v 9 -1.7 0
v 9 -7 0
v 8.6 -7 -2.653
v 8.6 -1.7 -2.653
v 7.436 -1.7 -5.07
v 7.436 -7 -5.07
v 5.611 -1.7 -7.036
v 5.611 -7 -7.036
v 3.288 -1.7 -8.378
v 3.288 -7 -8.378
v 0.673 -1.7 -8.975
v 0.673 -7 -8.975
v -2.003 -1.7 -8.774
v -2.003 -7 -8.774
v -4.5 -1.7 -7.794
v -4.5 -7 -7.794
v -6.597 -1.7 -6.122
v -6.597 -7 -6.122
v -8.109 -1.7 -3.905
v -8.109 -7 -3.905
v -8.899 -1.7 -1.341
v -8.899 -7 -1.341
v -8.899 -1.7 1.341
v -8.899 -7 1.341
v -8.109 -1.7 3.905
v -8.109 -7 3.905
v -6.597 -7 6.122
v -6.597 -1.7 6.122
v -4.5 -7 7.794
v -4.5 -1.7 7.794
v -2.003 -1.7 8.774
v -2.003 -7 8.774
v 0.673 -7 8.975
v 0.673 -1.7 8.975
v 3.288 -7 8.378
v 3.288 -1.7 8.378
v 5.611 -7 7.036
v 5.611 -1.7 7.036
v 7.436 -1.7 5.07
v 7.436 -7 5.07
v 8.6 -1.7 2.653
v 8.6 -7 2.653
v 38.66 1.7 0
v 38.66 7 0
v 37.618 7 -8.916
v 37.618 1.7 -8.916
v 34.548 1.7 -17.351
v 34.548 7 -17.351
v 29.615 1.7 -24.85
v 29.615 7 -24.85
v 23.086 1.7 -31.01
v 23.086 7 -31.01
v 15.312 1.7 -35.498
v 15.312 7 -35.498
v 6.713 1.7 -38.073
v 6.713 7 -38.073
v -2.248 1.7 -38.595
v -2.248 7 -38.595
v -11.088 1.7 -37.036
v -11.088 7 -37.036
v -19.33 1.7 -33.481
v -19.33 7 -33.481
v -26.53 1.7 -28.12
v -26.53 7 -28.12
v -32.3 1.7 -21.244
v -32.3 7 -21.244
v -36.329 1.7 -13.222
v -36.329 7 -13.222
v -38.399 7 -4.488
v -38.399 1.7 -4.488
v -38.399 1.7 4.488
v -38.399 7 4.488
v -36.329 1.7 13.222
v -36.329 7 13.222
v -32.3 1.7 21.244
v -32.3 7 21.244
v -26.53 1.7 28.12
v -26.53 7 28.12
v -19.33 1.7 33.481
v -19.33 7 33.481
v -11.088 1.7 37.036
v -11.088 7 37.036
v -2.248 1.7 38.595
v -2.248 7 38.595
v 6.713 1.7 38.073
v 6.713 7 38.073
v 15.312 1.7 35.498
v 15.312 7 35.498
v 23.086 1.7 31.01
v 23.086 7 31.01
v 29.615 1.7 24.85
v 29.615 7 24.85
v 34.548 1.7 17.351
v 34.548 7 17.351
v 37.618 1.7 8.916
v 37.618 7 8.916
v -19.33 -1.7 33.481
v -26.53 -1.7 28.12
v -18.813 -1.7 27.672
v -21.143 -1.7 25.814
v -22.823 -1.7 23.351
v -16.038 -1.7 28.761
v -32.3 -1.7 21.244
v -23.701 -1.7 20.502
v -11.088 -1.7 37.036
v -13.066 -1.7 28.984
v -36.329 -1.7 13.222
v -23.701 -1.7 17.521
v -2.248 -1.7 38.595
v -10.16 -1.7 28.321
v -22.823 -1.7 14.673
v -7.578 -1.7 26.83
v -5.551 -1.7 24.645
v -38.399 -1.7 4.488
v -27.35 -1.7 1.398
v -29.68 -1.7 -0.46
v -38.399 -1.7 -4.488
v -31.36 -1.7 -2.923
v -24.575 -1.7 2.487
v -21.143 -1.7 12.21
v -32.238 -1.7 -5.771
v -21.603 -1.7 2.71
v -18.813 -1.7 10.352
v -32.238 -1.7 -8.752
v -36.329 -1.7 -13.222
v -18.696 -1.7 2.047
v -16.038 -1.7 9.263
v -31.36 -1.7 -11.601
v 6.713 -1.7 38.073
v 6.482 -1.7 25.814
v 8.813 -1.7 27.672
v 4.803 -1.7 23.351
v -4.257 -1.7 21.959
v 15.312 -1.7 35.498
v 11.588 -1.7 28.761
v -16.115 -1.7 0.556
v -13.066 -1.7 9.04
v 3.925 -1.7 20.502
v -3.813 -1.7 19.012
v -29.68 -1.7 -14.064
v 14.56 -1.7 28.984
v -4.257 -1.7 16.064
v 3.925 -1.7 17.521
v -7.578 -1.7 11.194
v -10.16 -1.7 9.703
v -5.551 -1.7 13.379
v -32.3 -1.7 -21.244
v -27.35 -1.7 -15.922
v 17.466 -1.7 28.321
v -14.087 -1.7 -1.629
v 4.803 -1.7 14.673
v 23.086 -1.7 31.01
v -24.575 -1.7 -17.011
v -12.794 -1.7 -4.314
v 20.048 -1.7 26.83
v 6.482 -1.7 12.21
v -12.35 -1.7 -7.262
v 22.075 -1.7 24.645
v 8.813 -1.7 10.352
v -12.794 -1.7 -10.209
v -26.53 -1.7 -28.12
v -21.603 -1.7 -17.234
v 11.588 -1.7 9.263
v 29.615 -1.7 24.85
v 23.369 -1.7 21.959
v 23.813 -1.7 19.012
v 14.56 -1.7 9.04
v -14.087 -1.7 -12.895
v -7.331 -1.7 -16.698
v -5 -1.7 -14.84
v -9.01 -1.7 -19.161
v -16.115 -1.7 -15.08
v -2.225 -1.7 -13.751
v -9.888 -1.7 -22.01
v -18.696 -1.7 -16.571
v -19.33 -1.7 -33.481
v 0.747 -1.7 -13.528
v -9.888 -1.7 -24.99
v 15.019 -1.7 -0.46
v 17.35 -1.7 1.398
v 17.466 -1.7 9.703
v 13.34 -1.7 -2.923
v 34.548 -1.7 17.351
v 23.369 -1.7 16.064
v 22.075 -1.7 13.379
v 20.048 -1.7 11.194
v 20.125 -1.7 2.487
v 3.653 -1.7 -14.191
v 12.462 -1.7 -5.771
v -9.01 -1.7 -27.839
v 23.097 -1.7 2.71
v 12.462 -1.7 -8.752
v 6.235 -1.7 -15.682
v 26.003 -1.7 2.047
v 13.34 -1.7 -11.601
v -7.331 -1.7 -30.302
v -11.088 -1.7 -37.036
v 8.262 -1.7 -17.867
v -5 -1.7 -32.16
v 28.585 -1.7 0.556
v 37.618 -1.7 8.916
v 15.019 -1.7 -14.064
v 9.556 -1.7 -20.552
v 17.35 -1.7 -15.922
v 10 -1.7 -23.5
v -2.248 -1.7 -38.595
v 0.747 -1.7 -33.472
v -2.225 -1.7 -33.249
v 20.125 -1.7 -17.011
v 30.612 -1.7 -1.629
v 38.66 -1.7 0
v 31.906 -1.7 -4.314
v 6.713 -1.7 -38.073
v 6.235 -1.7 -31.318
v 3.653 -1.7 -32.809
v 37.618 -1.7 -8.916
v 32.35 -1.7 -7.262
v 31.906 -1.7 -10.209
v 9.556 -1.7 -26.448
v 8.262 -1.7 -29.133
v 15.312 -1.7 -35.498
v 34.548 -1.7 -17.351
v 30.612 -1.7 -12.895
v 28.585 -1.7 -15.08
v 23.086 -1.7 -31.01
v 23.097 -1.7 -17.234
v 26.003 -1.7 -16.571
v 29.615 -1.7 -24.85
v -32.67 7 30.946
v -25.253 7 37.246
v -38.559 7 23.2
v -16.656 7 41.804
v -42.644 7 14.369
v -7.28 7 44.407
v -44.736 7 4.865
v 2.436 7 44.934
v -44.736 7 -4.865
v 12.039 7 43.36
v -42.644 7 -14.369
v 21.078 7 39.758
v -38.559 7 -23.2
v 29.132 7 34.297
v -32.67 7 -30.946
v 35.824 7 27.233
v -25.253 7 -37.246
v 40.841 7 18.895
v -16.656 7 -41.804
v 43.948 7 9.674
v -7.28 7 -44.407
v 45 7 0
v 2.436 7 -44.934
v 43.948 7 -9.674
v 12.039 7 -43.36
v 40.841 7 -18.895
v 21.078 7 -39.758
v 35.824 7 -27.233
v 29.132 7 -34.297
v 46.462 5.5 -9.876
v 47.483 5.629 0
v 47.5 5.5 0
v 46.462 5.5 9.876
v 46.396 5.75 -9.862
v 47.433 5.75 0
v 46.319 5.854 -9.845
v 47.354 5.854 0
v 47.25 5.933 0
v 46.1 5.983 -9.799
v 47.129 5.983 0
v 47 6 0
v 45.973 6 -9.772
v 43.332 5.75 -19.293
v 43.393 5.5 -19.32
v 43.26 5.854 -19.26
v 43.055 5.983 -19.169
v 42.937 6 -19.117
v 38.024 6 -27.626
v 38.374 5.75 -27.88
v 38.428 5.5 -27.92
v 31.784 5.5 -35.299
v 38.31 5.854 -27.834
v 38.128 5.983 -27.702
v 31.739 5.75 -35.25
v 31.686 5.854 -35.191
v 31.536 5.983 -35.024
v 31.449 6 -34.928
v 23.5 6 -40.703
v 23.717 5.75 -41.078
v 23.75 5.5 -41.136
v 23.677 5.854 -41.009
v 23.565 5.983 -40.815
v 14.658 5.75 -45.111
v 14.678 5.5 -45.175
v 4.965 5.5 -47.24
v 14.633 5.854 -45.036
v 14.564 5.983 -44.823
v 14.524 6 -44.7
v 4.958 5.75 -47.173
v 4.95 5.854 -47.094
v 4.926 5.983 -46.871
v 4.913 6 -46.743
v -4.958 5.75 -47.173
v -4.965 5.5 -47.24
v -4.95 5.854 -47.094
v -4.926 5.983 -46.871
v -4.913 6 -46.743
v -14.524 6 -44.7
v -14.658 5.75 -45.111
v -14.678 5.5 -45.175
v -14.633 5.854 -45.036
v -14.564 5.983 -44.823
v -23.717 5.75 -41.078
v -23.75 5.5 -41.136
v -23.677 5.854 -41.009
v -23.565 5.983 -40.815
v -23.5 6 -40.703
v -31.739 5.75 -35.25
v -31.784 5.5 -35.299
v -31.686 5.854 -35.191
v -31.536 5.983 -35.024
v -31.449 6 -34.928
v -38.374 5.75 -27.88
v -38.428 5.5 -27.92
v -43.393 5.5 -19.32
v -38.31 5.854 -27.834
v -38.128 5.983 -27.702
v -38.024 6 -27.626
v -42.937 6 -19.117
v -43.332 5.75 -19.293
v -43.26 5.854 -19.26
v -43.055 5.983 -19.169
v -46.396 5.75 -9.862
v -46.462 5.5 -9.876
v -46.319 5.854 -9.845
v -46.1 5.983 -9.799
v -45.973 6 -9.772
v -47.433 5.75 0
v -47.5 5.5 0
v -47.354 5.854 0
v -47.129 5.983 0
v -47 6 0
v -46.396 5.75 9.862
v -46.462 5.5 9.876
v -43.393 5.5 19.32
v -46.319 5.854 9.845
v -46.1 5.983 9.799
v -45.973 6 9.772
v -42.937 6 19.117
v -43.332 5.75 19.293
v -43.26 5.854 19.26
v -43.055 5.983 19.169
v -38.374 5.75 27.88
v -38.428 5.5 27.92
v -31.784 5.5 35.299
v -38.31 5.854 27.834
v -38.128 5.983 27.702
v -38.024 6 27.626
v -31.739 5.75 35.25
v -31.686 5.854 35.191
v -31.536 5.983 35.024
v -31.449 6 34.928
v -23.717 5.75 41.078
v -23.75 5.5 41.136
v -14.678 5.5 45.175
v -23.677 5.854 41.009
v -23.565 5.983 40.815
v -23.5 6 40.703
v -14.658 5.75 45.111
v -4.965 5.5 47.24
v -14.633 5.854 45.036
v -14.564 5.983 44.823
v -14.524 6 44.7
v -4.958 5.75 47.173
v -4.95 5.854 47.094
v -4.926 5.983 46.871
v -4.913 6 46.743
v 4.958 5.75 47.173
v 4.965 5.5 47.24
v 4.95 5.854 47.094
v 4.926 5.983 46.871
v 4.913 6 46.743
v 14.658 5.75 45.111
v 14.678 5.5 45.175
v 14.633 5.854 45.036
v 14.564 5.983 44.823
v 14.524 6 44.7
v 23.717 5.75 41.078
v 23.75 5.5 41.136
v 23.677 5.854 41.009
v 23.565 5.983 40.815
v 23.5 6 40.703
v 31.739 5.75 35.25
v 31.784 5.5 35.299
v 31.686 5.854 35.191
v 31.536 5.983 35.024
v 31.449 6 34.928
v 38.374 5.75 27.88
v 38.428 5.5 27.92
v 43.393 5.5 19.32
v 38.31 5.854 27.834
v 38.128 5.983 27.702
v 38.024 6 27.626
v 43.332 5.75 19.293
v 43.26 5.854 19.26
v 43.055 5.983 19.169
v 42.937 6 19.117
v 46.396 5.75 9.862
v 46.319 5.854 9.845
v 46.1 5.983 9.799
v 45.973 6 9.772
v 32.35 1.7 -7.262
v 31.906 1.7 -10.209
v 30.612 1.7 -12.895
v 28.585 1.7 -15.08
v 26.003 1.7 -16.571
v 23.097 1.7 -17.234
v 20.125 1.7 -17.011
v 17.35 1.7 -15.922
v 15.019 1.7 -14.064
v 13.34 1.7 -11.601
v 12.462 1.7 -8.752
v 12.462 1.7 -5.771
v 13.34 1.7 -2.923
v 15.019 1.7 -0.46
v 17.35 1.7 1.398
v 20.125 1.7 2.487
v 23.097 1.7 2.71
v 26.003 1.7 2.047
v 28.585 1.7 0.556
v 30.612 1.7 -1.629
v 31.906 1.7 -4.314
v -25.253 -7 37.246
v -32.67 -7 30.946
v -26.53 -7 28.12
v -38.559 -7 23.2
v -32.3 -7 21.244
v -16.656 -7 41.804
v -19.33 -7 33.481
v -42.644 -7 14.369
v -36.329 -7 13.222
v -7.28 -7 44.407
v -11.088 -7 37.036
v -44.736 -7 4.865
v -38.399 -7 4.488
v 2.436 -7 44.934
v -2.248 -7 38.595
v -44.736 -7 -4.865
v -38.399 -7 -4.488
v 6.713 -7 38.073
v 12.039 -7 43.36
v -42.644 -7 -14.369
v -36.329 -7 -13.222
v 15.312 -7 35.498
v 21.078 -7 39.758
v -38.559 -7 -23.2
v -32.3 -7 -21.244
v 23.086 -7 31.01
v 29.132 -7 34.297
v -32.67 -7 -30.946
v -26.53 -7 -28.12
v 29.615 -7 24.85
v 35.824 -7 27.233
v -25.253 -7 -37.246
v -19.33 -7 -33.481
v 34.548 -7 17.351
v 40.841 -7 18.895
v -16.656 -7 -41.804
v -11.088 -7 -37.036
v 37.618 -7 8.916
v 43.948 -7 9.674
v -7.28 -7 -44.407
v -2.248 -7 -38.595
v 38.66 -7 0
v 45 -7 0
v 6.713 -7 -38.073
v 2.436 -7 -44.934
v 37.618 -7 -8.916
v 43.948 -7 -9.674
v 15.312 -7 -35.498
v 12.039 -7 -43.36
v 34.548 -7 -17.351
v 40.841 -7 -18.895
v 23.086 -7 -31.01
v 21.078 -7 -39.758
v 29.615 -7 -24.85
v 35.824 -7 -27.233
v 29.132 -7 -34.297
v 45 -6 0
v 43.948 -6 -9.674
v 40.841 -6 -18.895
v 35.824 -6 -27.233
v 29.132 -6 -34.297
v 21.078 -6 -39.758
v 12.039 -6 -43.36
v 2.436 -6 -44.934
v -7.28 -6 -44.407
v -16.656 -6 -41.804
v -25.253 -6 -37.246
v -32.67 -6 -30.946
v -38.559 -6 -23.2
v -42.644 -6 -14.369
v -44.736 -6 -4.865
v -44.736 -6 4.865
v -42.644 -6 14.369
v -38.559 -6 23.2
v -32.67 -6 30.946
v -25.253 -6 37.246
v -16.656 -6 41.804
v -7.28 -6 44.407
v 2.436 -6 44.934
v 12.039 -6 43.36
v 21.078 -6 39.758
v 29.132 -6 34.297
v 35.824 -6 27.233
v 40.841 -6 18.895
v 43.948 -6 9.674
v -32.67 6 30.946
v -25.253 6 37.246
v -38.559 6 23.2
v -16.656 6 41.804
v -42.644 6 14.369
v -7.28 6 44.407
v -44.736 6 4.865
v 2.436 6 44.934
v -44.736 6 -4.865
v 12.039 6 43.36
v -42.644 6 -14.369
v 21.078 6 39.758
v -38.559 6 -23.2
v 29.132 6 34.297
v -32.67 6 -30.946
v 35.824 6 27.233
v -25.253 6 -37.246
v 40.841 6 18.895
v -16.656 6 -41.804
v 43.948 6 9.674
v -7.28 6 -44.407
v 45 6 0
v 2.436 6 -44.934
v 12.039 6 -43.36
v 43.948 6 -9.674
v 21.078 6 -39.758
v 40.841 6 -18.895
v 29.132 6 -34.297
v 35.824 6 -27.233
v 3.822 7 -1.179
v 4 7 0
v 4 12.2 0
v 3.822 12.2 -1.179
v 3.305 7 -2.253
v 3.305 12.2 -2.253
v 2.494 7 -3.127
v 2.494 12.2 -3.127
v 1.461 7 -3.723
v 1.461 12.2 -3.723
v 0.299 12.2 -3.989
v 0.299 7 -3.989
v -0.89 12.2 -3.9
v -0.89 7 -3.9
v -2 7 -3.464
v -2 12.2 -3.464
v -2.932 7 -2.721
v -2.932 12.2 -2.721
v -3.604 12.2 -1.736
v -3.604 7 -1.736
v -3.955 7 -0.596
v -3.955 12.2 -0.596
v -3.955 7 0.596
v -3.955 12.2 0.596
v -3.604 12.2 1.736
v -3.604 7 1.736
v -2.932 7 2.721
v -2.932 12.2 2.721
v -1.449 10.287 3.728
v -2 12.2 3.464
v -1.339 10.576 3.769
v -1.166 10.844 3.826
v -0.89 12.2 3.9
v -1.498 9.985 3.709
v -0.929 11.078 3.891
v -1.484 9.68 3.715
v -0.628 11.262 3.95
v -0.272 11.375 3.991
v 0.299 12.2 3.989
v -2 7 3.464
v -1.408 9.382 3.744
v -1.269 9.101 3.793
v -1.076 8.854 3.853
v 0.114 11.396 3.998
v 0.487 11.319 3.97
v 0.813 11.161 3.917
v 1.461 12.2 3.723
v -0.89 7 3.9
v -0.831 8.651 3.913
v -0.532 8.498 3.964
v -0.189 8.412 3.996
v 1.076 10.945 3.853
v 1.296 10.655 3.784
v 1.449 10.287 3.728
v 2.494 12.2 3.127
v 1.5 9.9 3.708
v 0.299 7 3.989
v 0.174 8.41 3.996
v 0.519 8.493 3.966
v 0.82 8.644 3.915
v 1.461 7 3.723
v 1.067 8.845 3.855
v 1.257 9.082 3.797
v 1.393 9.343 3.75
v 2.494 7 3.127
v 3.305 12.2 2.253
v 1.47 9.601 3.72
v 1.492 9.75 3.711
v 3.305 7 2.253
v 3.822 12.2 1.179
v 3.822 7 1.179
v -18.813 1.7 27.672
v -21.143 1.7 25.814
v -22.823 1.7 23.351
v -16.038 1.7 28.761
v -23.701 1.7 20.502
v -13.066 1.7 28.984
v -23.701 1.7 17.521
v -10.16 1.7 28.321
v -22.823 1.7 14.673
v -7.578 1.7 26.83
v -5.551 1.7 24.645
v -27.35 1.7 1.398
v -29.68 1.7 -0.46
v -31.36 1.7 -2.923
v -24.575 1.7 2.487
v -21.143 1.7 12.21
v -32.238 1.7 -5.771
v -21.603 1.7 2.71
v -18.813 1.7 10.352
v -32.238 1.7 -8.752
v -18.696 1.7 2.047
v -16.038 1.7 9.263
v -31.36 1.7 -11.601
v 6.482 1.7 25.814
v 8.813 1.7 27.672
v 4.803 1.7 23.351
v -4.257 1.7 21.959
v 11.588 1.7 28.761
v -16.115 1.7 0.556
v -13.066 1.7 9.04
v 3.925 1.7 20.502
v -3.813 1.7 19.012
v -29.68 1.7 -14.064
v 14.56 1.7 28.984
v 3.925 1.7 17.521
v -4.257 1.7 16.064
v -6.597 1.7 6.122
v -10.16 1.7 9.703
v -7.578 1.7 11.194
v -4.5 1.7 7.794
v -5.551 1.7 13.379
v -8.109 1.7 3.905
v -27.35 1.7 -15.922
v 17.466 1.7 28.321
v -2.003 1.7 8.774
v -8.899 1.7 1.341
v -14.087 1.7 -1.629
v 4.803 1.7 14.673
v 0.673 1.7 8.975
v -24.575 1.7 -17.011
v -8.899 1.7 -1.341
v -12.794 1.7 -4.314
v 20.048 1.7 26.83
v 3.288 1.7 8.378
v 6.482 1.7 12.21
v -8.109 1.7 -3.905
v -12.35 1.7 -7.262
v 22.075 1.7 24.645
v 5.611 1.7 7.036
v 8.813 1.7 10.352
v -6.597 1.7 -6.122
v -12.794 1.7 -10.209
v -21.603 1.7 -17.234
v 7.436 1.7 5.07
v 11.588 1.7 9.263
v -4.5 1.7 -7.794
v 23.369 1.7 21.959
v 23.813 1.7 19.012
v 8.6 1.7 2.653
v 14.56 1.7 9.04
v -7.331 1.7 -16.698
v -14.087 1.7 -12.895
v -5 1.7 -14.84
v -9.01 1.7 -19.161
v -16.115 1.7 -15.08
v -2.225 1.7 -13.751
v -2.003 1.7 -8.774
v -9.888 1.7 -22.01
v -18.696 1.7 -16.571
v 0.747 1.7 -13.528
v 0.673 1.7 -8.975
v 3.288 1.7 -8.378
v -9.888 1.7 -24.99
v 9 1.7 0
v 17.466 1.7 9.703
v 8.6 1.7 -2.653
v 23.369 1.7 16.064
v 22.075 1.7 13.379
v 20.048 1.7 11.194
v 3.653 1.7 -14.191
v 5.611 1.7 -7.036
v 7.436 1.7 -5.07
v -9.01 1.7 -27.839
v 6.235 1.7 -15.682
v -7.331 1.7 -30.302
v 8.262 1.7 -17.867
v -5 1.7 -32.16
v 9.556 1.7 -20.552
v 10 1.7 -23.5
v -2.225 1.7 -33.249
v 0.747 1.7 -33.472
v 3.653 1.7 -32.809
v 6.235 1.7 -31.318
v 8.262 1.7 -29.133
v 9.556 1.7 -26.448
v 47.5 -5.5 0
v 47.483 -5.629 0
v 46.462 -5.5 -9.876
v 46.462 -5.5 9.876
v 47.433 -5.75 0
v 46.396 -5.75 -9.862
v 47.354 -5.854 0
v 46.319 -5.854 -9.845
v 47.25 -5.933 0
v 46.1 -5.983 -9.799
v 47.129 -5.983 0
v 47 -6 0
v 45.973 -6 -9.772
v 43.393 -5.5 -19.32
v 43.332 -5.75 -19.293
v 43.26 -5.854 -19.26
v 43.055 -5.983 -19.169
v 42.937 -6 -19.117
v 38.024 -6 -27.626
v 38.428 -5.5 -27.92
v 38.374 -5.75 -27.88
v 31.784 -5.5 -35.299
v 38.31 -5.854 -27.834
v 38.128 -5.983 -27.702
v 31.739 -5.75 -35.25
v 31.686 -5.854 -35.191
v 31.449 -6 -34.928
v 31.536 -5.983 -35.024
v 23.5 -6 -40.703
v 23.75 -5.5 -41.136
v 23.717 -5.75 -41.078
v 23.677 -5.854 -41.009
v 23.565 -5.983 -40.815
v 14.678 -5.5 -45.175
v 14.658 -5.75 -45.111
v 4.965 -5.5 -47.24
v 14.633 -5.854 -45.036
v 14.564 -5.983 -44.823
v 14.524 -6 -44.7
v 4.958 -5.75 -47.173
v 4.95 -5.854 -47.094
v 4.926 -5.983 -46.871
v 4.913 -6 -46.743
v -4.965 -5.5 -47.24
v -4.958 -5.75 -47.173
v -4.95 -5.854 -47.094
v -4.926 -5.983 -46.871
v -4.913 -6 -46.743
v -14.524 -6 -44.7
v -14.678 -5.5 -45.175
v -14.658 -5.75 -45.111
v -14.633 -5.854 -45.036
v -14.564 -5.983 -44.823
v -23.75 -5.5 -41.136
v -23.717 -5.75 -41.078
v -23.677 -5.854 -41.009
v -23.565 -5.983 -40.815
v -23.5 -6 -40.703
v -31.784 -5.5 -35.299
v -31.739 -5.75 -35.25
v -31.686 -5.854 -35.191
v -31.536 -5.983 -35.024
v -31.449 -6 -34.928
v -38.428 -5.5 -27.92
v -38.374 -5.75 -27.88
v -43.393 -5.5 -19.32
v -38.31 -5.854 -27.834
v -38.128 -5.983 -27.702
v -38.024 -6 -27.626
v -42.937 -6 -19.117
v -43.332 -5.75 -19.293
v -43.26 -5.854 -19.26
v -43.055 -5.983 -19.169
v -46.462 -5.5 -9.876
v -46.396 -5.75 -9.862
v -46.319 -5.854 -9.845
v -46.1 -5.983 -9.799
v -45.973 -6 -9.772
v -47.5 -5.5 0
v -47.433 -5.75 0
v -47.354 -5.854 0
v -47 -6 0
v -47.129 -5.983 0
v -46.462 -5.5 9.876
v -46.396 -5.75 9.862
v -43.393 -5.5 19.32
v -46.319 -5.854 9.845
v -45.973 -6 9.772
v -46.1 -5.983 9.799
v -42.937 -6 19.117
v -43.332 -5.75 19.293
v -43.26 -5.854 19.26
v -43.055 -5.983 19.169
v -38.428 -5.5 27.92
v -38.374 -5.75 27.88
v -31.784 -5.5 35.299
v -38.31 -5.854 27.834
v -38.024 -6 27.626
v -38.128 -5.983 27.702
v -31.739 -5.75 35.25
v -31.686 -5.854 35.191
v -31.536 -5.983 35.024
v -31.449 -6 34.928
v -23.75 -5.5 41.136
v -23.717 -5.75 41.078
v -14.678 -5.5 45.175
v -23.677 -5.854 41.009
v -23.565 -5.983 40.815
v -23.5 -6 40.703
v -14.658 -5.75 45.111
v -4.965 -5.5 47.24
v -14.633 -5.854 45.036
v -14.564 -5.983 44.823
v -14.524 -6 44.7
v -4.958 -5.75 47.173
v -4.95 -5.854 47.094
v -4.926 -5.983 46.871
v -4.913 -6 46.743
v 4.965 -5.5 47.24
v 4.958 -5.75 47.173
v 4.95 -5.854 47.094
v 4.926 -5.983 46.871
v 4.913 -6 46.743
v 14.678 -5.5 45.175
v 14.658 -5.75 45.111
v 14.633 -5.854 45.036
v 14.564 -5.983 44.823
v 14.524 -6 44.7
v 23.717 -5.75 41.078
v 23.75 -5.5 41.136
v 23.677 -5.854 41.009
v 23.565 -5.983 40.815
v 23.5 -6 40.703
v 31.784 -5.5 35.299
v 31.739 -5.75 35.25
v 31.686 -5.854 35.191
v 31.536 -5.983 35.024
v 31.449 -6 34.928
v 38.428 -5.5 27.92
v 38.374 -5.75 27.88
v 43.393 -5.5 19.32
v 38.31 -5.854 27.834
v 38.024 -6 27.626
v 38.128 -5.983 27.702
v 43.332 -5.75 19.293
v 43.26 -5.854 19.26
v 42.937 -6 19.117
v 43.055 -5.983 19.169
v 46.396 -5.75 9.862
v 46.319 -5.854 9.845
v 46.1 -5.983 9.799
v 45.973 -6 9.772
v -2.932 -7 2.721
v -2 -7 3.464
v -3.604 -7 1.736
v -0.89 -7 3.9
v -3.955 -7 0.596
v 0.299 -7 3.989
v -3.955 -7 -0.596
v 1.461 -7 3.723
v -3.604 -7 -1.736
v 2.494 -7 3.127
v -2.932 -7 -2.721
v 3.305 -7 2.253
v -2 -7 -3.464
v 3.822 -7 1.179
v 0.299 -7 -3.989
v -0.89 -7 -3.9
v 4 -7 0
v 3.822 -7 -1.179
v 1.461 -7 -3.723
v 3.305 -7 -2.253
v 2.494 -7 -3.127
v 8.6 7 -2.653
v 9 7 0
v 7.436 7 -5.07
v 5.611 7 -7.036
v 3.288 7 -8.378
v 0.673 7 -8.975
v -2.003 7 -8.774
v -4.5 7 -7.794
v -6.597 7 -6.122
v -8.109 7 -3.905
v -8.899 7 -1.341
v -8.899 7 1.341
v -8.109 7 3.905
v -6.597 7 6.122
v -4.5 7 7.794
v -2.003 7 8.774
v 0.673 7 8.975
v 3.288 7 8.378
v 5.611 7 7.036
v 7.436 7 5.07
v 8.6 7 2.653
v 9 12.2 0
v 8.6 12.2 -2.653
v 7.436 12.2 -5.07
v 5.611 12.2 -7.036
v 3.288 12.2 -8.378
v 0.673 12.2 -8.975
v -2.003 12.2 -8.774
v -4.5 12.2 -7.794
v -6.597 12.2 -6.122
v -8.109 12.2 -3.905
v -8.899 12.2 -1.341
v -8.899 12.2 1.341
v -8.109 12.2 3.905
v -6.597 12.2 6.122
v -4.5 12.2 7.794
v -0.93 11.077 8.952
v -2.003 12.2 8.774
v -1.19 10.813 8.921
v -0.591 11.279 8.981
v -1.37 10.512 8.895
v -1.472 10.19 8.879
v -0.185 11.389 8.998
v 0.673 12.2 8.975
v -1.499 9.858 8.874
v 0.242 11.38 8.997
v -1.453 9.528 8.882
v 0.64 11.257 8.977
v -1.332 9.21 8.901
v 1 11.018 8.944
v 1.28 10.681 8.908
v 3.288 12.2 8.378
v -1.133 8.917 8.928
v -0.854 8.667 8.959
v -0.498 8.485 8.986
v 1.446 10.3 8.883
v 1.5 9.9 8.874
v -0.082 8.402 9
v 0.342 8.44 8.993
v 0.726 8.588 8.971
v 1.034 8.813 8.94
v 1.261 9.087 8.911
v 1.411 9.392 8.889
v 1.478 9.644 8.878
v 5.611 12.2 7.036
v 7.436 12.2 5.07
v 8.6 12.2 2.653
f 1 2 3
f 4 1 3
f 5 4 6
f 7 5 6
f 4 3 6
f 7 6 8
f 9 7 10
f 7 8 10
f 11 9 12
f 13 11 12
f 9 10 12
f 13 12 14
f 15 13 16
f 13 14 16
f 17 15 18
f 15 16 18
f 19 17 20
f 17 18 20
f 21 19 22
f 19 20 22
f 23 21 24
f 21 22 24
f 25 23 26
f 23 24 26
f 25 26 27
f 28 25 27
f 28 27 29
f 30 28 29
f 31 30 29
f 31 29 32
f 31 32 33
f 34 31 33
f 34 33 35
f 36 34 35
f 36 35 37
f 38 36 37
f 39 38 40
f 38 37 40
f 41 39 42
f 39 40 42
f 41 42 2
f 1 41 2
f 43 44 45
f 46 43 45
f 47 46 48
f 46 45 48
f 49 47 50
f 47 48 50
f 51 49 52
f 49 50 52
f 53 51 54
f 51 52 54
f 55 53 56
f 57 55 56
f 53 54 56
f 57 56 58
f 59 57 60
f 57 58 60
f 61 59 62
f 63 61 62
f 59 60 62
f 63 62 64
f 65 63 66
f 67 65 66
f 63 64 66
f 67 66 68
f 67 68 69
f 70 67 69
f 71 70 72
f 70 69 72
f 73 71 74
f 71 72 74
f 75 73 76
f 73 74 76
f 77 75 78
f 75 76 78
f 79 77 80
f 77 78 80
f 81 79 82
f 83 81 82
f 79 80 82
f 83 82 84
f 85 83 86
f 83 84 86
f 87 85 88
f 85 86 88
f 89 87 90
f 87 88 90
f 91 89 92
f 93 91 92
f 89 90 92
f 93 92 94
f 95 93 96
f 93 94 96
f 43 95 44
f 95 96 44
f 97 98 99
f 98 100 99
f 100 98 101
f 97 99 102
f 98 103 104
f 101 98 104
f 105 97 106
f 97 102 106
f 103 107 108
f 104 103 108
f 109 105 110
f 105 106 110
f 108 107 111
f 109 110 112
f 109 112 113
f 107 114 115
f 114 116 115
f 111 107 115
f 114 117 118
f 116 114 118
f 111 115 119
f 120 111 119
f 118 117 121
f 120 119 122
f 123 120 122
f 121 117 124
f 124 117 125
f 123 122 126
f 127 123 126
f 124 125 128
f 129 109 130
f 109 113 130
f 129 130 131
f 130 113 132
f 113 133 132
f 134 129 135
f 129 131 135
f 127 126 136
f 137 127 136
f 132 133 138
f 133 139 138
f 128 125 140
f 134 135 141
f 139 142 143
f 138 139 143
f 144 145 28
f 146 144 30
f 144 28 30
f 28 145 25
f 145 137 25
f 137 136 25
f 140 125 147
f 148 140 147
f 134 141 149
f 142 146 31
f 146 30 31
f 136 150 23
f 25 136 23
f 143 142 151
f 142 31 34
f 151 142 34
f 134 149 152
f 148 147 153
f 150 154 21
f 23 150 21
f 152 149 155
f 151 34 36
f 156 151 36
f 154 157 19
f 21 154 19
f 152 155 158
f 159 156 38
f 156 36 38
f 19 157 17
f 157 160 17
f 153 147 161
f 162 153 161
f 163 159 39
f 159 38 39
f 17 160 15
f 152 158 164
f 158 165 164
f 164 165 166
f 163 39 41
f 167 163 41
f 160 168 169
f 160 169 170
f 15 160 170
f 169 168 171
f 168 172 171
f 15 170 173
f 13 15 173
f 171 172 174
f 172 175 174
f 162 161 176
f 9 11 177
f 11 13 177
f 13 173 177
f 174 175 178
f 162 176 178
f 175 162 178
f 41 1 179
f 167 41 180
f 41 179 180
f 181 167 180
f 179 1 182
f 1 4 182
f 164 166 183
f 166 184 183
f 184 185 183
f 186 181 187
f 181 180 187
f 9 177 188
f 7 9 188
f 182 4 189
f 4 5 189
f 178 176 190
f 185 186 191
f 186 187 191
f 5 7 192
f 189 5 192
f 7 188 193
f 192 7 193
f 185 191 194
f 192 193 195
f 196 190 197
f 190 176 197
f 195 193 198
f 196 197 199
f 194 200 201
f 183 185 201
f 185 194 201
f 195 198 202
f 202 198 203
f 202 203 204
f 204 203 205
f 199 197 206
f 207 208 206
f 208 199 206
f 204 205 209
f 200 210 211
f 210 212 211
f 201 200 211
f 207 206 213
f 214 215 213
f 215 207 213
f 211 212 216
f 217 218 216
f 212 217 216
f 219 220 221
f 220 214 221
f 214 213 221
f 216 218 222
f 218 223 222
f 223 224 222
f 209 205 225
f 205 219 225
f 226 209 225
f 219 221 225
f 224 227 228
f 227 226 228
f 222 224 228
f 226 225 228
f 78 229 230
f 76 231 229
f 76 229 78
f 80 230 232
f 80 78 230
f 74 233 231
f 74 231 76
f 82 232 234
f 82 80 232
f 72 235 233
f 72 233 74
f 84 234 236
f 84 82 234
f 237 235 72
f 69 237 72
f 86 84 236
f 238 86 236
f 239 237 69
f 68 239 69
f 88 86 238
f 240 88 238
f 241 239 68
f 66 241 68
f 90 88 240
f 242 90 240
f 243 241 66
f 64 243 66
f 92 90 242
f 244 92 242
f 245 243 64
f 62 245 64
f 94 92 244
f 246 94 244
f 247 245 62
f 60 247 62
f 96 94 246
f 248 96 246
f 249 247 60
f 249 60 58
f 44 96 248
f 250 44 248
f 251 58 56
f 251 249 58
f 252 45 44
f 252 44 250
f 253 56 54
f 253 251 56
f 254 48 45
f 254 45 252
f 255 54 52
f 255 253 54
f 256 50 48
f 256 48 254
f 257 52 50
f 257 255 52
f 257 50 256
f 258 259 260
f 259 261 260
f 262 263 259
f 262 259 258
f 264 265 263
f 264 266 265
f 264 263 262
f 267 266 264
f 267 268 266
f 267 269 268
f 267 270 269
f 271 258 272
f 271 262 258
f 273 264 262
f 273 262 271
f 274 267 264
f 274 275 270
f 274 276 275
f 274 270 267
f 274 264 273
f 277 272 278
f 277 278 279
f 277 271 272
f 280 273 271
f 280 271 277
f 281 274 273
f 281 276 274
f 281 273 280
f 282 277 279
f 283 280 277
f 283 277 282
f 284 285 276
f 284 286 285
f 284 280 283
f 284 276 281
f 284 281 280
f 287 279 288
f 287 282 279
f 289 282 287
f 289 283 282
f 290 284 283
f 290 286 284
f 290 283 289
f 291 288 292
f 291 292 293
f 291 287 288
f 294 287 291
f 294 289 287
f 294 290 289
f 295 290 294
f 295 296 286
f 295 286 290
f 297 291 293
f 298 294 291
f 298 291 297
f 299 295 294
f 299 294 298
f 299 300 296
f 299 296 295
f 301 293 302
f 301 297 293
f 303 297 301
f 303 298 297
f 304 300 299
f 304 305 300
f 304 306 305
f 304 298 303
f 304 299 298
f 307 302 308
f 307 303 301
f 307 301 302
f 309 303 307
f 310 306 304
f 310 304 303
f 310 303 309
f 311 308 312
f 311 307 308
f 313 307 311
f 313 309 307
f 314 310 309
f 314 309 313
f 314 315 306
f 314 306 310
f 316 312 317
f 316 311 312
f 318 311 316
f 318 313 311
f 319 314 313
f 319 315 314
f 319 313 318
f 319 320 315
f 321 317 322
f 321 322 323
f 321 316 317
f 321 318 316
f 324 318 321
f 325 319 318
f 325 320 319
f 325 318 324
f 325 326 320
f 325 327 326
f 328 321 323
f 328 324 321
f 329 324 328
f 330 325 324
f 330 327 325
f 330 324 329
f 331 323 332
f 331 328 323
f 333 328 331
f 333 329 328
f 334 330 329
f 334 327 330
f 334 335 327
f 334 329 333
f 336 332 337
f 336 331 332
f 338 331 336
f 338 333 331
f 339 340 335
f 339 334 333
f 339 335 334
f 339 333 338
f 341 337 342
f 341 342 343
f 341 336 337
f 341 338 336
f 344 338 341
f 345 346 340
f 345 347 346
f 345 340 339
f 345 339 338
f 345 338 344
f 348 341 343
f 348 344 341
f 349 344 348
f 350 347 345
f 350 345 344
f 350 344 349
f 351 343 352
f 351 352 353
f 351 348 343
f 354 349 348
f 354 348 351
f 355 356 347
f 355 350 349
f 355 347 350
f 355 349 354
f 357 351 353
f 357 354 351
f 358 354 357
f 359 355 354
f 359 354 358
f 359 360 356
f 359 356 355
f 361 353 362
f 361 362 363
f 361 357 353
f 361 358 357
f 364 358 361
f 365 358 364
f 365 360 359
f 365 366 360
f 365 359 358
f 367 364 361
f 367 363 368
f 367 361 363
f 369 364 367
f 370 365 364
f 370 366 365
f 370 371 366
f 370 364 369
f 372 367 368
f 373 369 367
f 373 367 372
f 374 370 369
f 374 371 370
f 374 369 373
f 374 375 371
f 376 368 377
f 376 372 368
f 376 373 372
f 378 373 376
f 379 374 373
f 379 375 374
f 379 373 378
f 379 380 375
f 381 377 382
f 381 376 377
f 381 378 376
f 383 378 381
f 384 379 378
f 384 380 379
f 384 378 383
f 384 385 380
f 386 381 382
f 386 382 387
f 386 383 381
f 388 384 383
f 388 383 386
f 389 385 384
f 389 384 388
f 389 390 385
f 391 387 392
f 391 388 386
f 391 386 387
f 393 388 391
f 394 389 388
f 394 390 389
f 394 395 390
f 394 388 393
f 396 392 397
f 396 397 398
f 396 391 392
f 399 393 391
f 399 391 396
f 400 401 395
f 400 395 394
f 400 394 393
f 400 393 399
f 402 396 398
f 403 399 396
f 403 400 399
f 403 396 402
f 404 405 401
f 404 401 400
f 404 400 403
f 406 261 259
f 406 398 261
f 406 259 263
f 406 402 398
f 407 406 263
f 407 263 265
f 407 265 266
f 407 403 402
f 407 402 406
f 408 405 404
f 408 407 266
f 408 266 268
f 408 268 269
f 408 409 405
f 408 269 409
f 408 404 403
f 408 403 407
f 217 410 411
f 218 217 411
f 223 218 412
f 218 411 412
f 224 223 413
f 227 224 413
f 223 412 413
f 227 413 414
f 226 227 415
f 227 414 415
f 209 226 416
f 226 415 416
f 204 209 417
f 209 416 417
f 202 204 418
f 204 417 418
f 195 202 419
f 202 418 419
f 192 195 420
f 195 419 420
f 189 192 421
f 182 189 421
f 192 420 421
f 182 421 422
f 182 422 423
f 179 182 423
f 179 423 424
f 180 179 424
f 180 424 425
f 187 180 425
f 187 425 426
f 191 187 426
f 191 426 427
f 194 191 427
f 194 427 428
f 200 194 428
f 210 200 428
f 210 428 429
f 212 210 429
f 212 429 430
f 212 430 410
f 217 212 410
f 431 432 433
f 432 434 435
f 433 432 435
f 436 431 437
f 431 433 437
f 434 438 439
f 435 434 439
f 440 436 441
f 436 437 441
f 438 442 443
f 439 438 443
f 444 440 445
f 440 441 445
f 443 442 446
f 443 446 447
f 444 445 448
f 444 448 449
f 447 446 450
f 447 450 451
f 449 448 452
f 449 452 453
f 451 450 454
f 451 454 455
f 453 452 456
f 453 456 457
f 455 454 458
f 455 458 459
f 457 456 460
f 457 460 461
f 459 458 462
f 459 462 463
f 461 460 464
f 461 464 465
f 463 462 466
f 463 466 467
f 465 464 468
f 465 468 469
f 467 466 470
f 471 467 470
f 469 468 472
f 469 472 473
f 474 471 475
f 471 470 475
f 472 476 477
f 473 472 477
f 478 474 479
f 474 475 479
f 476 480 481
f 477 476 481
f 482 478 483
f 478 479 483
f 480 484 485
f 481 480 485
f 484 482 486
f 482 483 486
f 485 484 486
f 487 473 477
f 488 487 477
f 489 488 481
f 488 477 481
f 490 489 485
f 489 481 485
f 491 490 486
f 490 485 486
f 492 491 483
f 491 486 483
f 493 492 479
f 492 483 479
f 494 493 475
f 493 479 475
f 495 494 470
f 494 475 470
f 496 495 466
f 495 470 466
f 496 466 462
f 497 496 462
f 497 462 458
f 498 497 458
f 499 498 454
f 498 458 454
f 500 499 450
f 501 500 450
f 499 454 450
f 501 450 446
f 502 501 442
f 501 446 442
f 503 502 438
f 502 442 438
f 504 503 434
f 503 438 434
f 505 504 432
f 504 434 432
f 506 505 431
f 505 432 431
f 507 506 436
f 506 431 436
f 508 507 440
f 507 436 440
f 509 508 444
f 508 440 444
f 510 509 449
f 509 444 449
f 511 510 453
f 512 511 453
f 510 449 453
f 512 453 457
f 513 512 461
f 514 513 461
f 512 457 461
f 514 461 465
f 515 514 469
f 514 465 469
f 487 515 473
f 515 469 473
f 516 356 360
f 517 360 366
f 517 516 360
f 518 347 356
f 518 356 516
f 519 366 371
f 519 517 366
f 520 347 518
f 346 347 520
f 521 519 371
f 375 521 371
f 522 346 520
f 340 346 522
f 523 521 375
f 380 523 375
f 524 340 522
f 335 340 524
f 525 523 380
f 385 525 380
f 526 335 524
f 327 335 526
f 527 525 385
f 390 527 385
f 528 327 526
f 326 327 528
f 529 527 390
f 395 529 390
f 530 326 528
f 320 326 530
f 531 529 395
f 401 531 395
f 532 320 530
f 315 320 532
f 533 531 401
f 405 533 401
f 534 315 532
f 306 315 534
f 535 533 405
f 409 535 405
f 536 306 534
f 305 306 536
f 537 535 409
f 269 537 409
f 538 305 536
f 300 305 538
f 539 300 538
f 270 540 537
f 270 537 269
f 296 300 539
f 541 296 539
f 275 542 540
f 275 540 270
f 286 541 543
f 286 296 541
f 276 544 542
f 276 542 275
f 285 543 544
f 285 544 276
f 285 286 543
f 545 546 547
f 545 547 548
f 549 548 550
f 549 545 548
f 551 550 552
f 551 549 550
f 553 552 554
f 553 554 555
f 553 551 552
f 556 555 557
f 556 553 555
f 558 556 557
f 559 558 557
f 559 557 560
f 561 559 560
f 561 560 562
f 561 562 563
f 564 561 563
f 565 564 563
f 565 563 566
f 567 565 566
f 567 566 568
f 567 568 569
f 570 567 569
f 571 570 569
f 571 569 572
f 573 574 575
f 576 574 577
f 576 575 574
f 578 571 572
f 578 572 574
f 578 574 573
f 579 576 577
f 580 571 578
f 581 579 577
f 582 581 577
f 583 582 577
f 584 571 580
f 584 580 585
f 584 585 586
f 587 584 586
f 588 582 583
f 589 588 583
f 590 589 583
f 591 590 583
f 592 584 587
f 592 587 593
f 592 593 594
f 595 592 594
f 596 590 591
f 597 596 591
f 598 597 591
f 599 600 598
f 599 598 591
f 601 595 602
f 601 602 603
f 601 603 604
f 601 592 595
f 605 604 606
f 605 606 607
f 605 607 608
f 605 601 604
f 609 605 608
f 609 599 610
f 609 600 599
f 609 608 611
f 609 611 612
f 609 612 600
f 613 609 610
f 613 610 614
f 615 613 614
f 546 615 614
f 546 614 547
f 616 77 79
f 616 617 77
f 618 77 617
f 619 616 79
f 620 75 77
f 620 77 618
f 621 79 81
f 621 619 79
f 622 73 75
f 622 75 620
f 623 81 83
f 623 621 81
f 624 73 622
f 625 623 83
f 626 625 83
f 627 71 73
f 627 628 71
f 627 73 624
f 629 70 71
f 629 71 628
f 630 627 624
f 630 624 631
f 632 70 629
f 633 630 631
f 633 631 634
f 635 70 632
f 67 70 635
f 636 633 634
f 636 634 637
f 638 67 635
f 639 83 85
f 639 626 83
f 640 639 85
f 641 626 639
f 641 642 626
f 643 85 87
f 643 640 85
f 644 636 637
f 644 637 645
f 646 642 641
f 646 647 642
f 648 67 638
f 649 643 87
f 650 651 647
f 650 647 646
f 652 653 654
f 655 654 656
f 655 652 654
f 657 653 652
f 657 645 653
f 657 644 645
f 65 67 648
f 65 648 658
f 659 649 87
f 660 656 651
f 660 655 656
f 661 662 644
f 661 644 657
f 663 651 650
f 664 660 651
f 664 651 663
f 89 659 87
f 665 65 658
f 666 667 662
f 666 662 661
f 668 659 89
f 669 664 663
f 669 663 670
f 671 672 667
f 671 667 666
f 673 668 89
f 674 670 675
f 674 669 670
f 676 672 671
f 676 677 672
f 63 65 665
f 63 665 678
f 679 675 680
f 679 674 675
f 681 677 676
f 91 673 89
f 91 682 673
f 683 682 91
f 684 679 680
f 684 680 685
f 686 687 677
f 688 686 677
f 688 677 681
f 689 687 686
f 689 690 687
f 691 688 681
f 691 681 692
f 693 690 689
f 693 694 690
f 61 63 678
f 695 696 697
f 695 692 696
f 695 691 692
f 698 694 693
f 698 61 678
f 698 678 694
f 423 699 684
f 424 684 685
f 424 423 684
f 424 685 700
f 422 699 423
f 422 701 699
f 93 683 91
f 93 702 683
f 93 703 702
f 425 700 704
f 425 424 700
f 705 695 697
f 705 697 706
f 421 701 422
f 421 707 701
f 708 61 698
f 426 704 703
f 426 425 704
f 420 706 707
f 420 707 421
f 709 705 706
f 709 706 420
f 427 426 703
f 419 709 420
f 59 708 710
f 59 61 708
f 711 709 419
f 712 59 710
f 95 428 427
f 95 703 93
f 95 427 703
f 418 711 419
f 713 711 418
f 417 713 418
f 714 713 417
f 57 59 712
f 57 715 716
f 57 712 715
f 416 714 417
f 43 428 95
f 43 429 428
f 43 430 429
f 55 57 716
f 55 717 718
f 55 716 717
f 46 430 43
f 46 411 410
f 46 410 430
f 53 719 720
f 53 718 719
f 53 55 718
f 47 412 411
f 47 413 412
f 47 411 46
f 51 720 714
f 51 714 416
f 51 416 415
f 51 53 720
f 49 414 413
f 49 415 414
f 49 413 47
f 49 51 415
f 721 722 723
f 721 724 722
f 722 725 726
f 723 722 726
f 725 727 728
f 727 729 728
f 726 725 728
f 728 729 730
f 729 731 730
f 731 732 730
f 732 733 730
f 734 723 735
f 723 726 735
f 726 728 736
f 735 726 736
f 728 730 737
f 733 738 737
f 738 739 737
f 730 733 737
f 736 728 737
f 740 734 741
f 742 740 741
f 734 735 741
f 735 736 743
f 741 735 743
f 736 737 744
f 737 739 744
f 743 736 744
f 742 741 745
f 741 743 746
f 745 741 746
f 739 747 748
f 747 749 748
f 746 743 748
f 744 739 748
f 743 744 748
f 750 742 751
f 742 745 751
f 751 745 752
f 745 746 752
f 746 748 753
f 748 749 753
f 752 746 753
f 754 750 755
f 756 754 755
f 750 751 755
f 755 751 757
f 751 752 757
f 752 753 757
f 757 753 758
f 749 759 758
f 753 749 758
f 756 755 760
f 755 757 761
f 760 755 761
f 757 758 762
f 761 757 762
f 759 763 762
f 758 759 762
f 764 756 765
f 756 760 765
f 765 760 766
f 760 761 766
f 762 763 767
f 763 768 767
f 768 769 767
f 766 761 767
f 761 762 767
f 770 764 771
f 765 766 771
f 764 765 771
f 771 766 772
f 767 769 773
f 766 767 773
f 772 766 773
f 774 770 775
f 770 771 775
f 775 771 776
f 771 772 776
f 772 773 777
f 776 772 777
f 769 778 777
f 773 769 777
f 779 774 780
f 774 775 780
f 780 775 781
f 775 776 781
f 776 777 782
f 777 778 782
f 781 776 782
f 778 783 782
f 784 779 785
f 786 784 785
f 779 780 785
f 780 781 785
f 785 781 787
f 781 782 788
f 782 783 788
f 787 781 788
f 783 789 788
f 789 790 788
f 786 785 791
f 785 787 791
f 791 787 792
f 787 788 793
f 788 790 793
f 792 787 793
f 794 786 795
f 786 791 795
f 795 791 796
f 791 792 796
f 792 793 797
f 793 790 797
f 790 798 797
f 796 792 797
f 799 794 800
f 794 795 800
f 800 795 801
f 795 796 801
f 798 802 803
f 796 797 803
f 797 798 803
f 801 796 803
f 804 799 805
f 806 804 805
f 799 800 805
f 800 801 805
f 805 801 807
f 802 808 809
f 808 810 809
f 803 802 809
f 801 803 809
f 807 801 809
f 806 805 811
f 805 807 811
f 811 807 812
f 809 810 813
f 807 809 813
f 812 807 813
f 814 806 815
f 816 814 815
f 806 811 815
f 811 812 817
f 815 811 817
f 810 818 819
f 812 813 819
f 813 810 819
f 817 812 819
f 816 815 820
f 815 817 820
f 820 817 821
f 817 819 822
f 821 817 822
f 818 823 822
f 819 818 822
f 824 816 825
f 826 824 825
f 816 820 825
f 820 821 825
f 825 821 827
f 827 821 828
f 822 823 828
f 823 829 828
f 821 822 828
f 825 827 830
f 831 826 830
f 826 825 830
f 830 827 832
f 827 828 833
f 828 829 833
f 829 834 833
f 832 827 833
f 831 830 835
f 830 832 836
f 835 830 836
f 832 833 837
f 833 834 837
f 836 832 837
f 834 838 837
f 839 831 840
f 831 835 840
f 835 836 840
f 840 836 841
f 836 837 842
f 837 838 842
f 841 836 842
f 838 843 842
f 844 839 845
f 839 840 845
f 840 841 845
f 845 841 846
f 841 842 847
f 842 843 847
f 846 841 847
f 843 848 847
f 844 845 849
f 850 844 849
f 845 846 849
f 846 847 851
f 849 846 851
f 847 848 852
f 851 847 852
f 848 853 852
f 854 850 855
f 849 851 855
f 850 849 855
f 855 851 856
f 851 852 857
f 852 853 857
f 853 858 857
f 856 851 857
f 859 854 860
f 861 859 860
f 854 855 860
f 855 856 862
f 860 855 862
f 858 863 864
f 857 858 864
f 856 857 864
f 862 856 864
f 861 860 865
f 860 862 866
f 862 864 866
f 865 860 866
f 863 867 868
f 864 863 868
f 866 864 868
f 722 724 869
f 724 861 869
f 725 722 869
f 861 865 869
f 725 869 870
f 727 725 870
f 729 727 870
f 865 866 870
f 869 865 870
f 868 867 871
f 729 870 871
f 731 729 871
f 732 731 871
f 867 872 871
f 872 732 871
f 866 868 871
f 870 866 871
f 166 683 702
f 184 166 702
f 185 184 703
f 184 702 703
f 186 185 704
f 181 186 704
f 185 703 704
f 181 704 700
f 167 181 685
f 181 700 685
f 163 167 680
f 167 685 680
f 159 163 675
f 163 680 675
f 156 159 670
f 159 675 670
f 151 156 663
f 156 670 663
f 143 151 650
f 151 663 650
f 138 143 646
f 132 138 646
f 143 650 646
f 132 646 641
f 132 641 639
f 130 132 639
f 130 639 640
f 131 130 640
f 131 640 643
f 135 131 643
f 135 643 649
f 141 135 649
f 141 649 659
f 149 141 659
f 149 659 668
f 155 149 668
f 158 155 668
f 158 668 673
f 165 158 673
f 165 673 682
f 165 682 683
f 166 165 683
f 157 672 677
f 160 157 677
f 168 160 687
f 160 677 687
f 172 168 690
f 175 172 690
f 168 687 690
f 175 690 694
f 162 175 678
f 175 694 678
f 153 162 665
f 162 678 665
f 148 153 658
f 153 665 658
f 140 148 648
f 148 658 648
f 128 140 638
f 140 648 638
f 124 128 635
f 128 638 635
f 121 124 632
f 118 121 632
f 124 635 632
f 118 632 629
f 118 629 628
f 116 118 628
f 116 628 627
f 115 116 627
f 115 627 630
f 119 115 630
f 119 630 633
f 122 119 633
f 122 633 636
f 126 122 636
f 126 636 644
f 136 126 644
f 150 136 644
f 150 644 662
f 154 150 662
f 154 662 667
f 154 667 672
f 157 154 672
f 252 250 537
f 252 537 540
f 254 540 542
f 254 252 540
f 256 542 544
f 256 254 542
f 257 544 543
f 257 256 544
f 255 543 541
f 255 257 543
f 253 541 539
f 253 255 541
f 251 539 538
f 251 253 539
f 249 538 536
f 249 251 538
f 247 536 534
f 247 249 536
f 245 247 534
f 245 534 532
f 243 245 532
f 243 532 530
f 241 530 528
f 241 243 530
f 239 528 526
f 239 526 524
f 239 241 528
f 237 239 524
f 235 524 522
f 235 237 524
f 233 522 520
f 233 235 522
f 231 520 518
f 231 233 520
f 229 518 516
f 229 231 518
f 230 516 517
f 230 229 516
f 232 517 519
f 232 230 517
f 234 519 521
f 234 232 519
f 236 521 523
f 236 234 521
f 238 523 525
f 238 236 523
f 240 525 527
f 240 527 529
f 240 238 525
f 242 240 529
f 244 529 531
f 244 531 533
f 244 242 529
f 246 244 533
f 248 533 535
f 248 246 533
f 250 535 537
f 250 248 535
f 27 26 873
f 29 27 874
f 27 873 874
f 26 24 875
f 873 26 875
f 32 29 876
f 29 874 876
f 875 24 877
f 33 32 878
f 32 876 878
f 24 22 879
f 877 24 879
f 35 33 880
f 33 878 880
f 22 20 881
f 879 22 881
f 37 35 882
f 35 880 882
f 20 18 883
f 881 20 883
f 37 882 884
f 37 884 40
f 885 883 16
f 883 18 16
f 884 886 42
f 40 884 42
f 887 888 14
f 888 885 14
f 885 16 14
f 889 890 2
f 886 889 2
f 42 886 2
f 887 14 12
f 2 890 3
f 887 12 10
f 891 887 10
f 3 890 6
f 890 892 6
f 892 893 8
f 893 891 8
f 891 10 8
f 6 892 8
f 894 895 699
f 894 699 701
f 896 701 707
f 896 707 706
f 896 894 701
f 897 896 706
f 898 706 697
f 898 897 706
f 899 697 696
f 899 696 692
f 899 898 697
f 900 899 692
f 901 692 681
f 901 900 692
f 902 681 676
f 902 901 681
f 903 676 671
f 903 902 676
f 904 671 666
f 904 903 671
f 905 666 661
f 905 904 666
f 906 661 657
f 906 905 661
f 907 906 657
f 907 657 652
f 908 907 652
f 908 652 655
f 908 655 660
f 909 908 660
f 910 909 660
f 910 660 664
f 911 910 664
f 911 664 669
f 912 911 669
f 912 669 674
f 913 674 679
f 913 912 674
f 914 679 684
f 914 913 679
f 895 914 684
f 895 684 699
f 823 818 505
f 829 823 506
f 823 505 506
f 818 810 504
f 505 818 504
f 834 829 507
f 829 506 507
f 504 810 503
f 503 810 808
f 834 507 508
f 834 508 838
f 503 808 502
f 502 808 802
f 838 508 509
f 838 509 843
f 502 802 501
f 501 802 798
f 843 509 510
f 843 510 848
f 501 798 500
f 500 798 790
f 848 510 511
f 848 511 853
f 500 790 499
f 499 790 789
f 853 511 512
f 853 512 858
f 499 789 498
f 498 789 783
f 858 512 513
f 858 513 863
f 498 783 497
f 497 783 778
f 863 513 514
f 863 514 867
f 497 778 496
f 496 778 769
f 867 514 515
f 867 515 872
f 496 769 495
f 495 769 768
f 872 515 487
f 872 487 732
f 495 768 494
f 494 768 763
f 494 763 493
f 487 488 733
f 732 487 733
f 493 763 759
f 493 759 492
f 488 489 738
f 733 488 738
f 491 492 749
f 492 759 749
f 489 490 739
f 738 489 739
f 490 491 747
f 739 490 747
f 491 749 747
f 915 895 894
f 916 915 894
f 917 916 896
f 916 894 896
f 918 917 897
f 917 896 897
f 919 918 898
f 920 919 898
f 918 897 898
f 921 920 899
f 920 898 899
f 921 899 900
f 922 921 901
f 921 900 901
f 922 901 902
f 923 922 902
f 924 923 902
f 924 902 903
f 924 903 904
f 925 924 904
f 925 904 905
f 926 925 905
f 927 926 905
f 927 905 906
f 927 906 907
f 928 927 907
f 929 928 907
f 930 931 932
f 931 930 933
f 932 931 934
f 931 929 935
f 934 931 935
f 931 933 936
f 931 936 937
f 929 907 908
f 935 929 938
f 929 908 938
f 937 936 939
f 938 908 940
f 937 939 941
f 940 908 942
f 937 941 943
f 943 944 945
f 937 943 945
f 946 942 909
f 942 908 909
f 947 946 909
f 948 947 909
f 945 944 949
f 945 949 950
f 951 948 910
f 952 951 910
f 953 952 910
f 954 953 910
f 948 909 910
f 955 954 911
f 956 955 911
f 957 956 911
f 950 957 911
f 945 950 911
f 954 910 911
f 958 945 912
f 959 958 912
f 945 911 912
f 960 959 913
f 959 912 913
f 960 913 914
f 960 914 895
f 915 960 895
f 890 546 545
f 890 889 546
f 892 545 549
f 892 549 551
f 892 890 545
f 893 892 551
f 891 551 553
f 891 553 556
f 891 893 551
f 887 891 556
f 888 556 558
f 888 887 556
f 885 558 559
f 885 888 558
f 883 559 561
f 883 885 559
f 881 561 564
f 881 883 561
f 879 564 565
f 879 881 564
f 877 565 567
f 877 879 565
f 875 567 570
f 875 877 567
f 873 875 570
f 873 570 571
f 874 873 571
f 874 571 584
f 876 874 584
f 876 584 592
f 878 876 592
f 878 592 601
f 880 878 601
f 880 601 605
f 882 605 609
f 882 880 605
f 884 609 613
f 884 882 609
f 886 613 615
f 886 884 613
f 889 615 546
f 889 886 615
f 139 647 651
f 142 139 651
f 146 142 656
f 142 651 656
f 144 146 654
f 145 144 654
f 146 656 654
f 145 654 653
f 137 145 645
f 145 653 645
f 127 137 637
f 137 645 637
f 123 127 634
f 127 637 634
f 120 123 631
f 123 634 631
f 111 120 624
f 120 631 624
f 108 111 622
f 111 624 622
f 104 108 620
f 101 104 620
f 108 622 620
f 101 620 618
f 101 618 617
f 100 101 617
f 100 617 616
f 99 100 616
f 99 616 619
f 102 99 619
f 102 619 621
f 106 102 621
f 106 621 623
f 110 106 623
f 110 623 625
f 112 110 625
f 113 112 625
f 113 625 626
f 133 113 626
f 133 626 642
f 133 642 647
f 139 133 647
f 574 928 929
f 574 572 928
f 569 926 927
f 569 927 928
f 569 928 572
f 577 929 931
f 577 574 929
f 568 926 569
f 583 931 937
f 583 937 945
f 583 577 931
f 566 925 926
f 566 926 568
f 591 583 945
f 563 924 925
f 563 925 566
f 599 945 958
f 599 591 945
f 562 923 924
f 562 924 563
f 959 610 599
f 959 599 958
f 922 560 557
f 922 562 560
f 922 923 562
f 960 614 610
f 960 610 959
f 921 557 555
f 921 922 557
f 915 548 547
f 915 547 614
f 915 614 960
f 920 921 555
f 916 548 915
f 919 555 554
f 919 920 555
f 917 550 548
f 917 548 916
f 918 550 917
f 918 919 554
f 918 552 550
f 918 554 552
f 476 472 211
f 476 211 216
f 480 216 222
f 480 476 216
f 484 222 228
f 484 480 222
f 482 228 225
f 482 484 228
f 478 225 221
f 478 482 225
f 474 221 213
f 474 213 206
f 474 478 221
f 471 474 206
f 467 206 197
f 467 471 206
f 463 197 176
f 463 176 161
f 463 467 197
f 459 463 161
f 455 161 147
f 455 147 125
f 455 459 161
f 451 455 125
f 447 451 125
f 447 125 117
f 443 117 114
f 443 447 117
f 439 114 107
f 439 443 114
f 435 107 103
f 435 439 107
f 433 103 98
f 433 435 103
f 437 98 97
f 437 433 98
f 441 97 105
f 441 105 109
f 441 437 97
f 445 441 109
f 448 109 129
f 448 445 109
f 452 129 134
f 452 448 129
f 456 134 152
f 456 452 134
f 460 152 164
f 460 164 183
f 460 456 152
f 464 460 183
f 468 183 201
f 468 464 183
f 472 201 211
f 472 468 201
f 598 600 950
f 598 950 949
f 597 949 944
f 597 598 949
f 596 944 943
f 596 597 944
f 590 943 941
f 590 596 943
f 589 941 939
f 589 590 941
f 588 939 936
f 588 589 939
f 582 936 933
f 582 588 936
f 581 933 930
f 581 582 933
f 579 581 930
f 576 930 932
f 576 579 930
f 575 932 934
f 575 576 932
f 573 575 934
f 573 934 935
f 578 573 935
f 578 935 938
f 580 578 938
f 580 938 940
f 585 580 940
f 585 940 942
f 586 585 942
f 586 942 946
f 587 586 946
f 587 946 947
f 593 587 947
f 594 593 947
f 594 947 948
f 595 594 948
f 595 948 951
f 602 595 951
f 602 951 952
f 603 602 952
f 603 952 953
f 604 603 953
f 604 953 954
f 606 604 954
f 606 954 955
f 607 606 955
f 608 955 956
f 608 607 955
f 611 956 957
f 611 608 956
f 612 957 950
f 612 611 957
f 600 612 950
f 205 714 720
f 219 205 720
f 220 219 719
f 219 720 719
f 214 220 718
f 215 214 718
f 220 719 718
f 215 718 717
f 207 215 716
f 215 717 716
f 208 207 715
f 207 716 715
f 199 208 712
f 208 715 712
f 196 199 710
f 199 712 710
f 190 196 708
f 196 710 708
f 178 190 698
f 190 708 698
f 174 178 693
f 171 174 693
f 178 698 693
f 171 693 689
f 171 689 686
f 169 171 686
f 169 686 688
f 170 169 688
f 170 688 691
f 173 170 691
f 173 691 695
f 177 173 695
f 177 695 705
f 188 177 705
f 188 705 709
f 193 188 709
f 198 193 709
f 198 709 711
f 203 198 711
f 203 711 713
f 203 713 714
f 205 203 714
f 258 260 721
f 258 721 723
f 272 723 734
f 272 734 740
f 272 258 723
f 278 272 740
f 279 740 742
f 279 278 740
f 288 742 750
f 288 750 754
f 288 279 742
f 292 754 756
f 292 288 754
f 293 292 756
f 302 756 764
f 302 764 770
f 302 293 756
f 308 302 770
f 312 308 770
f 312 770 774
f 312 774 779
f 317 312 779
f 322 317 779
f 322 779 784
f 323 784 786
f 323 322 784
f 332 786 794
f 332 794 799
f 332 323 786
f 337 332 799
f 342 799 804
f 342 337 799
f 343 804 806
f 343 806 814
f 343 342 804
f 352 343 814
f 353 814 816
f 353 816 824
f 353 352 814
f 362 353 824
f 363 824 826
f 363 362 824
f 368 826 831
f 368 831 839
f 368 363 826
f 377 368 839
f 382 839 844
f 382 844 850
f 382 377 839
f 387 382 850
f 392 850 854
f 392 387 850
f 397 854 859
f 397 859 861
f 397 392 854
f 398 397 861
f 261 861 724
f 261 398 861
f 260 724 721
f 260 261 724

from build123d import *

# Parameters (mm, degrees)
SKETCH_1_R          = 47.5
SKETCH_1_R_2        = 9
SKETCH_1_R_3        = 4
EXTRUDE_1_DEPTH     = 7
SKETCH_2_R          = 47.5
SKETCH_2_R_2        = 45
CUT_EXTRUDE_1_DEPTH = 1
SKETCH_3_R          = 38.66
SKETCH_3_R_2        = 9
CUT_EXTRUDE_2_DEPTH = 5.3
SKETCH_4_R          = 10
CUT_EXTRUDE_3_DEPTH = 9.7
FILLET_1_R          = 0.5
SKETCH_5_R          = 9
SKETCH_5_R_2        = 4
EXTRUDE_2_DEPTH     = 5.2
SKETCH_6_R          = 1.5
CUT_EXTRUDE_4_DEPTH = 48.5000001


with BuildPart() as part:
    # 草圖1 → 填料-伸長1 (new body, symmetric)
    with BuildSketch(Plane(origin=(0, 0, 0), x_dir=(1, 0, 0), z_dir=(0, 1, 0))):
        Circle(SKETCH_1_R)
        Circle(SKETCH_1_R_2, mode=Mode.SUBTRACT)
        Circle(SKETCH_1_R_2)
        Circle(SKETCH_1_R_3, mode=Mode.SUBTRACT)
    extrude(amount=EXTRUDE_1_DEPTH, both=True)

    # 草圖2 → 除料-伸長1 (cut)
    with BuildSketch(Plane(origin=(0, 7, 0), x_dir=(1, 0, 0), z_dir=(0, 1, 0))):
        Circle(SKETCH_2_R)
        Circle(SKETCH_2_R_2, mode=Mode.SUBTRACT)
    cut_extrude_1 = extrude(amount=-CUT_EXTRUDE_1_DEPTH, mode=Mode.SUBTRACT)

    # 鏡射1: 除料-伸長1 across plane
    add(cut_extrude_1.mirror(Plane.ZX), mode=Mode.SUBTRACT)

    # 草圖3 → 除料-伸長2 (cut)
    with BuildSketch(Plane(origin=(0, 7, 0), x_dir=(1, 0, 0), z_dir=(0, 1, 0))):
        Circle(SKETCH_3_R)
        Circle(SKETCH_3_R_2, mode=Mode.SUBTRACT)
    cut_extrude_2 = extrude(amount=-CUT_EXTRUDE_2_DEPTH, mode=Mode.SUBTRACT)

    # 鏡射2: 除料-伸長2 across plane
    add(cut_extrude_2.mirror(Plane.ZX), mode=Mode.SUBTRACT)

    # 草圖4 → 除料-伸長3 (cut, through all)
    with BuildSketch(Plane(origin=(0, 1.7, 0), x_dir=(1, 0, 0), z_dir=(0, 1, 0))):
        with Locations((0, 23.5)):
            Circle(SKETCH_4_R)
        with Locations((22.349828133, 7.261899368)):
            Circle(SKETCH_4_R)
        with Locations((13.812953429, -19.011899368)):
            Circle(SKETCH_4_R)
        with Locations((-13.812953429, -19.011899368)):
            Circle(SKETCH_4_R)
        with Locations((-22.349828133, 7.261899368)):
            Circle(SKETCH_4_R)
    extrude(amount=-CUT_EXTRUDE_3_DEPTH, mode=Mode.SUBTRACT)

    # 圓角1
    fillet_1_edges = [part.edges().sort_by_distance(p)[0] for p in [
        (-47.5, 6, 0),
        (-47.5, -6, 0),
    ]]
    fillet(fillet_1_edges, radius=FILLET_1_R)

    # 草圖5 → 填料-伸長2 (add)
    with BuildSketch(Plane(origin=(0, 7, 0), x_dir=(1, 0, 0), z_dir=(0, 1, 0))):
        Circle(SKETCH_5_R)
        Circle(SKETCH_5_R_2, mode=Mode.SUBTRACT)
    extrude(amount=EXTRUDE_2_DEPTH)

    # 草圖6 → 除料-伸長4 (cut, through all)
    with BuildSketch(Plane.XY):
        with Locations((0, 9.9)):
            Circle(SKETCH_6_R)
    extrude(amount=CUT_EXTRUDE_4_DEPTH, mode=Mode.SUBTRACT)


solid = part.part
